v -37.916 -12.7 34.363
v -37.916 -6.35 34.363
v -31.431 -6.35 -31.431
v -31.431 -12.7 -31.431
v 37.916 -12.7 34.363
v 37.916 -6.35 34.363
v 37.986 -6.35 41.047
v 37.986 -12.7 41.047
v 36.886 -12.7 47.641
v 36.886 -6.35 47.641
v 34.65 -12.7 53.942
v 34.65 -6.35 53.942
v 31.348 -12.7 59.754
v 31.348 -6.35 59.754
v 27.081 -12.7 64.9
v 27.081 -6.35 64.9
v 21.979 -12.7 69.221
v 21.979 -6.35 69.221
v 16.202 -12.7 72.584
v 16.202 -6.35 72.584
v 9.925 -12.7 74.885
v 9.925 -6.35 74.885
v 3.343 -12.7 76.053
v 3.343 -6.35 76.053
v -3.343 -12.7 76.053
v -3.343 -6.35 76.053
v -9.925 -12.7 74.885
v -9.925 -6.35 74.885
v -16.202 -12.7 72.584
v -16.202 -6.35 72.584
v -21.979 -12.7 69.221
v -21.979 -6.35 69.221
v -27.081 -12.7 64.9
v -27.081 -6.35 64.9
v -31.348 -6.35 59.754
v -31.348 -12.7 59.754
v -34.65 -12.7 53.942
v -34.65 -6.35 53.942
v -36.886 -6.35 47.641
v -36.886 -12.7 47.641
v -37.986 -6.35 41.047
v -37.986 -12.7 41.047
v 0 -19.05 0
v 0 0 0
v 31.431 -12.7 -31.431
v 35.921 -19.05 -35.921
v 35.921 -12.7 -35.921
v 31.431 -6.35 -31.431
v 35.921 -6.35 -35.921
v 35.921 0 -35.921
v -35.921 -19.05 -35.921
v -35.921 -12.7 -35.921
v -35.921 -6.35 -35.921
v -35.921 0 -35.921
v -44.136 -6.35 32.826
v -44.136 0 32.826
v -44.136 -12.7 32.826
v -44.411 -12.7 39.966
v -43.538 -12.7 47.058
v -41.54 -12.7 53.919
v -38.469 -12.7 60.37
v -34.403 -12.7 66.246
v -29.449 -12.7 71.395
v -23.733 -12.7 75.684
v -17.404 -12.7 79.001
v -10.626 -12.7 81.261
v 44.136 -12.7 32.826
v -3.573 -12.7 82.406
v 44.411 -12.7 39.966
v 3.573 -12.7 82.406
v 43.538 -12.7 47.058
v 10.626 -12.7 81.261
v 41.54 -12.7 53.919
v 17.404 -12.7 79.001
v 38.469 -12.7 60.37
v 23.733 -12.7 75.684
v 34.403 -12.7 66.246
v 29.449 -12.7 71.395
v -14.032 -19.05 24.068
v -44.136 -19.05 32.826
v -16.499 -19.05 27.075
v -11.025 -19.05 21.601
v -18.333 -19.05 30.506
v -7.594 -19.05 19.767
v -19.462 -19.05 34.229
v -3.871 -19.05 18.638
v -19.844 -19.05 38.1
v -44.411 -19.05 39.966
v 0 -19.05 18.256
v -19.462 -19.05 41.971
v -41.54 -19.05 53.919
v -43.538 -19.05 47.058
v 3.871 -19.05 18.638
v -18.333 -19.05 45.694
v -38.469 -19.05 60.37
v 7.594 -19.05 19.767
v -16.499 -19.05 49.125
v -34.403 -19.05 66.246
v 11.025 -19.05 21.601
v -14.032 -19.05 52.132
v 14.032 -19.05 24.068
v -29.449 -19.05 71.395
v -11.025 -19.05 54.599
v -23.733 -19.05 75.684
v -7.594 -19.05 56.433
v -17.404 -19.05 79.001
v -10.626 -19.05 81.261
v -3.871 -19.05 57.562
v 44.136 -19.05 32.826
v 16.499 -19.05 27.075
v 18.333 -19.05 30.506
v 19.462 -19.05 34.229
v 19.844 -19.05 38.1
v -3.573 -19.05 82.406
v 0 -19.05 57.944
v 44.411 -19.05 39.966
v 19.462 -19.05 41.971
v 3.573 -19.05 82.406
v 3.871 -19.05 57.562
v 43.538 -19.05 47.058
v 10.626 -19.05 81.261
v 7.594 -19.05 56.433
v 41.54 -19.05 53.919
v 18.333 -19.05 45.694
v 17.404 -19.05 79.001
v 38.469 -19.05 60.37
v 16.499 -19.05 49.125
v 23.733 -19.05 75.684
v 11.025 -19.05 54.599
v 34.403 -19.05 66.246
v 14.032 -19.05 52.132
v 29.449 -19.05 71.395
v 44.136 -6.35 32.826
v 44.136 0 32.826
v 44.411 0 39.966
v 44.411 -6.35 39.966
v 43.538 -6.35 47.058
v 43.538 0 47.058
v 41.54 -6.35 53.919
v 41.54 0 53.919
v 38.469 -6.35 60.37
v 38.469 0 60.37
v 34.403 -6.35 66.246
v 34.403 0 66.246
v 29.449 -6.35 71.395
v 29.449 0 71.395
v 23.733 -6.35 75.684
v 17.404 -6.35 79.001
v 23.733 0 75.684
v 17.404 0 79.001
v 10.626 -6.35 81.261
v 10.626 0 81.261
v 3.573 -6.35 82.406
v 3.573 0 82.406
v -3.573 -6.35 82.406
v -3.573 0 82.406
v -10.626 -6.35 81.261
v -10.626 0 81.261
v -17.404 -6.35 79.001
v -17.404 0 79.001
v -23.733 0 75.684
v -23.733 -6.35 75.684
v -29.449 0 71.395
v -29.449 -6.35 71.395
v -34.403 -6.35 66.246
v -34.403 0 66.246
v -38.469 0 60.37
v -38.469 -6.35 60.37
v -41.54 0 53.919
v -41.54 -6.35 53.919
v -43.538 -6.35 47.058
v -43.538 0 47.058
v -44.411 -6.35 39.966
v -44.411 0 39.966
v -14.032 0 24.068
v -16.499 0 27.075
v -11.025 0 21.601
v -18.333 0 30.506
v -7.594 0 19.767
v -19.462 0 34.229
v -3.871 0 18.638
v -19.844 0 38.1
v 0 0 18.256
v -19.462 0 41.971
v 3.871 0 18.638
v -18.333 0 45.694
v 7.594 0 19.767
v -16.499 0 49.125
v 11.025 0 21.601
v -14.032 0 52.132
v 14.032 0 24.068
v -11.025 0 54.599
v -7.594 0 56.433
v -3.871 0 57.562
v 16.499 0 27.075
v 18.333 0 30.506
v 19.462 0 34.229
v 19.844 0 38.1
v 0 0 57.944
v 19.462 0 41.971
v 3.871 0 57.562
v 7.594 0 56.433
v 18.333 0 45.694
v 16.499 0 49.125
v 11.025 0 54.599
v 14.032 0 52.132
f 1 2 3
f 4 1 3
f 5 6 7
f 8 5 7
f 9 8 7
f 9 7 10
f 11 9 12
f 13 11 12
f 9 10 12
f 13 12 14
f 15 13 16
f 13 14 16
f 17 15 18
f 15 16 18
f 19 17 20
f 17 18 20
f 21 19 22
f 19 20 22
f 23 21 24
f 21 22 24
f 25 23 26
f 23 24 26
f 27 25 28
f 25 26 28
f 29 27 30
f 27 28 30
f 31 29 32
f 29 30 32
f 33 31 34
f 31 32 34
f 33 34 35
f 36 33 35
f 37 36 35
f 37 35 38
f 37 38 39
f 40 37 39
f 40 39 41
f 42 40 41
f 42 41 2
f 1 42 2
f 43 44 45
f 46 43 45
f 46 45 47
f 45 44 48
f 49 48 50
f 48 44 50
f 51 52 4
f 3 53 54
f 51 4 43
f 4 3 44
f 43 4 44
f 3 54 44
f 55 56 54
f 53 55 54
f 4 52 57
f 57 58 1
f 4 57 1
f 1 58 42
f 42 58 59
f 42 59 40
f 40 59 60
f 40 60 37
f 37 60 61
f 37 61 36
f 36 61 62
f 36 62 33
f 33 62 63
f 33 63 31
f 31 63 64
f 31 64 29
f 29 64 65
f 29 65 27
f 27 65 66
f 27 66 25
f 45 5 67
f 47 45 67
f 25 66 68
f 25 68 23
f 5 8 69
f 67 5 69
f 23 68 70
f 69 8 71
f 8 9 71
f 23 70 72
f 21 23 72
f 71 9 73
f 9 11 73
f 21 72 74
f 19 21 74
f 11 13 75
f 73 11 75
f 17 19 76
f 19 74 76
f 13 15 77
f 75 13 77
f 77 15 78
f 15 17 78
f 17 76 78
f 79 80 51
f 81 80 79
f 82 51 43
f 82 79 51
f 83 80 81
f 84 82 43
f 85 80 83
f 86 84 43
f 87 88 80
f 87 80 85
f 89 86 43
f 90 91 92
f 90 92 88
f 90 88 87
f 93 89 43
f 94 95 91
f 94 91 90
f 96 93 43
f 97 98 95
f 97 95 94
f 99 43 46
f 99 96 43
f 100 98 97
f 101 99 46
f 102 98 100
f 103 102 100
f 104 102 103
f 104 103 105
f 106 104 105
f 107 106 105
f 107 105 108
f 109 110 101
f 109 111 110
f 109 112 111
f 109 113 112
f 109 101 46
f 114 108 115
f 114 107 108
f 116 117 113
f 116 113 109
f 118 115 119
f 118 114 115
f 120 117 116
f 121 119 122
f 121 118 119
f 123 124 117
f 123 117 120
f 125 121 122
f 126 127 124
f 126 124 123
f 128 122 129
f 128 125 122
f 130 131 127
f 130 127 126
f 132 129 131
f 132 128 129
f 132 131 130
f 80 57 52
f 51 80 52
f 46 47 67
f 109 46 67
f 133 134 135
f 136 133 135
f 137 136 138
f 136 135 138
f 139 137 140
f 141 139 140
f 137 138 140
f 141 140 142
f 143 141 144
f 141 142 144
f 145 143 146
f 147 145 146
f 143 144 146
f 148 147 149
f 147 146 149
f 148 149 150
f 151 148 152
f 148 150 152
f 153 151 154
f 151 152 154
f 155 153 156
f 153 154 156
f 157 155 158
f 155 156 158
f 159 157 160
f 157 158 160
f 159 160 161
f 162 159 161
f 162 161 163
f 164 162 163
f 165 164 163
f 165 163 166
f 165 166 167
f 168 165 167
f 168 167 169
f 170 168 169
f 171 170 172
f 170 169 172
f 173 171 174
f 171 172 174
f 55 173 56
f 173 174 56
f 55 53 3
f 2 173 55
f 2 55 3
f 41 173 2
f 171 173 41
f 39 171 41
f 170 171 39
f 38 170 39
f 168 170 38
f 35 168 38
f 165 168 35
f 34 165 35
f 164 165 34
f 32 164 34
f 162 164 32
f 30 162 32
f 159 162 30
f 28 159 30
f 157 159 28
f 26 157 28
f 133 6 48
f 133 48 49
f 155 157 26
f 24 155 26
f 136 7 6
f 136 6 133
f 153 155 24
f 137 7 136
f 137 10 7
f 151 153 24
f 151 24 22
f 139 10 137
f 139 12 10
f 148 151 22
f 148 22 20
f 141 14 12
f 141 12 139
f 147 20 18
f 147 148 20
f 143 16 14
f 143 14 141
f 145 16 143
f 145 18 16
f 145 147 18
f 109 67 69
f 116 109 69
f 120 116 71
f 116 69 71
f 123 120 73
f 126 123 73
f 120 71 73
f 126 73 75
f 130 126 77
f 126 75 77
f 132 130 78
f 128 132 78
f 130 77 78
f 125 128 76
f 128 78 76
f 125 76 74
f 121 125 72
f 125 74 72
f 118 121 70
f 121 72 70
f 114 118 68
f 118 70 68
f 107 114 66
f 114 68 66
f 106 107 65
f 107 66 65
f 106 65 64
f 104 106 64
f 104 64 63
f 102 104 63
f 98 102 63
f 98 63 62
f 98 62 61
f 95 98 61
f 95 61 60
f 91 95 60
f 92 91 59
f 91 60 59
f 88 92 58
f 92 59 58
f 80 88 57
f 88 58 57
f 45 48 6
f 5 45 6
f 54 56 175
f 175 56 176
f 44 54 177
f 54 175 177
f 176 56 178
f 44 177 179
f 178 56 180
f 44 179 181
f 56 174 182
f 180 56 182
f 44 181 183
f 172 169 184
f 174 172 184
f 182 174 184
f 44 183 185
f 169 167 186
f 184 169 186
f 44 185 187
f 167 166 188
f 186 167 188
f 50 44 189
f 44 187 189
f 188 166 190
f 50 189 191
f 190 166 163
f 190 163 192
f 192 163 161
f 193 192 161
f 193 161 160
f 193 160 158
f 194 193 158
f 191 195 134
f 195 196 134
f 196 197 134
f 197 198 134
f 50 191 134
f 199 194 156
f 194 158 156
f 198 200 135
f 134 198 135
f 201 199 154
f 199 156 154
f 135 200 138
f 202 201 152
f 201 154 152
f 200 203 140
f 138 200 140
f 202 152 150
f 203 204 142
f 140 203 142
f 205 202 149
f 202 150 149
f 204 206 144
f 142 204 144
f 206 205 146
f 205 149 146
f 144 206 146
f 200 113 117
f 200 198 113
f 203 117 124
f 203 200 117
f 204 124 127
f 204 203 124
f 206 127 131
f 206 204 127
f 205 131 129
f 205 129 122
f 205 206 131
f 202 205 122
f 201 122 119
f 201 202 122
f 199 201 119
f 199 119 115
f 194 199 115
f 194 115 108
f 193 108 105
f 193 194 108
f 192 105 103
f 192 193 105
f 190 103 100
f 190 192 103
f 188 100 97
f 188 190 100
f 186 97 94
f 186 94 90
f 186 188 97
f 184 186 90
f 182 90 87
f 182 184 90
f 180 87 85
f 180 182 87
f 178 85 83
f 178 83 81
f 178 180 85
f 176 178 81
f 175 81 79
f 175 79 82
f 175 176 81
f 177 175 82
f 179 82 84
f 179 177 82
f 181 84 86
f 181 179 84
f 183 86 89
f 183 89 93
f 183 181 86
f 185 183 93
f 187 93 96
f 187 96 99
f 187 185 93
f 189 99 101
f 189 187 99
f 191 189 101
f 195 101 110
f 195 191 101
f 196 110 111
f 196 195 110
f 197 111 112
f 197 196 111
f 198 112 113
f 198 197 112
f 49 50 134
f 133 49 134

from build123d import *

# Parameters (mm, degrees)
SKETCH_R            = 19.84375
PAD_DEPTH           = 6.35
SKETCH001_R         = 19.84375
PAD001_DEPTH        = 6.35
LINEARPATTERN_COUNT = 2
LINEARPATTERN_PITCH = 12.7


with BuildPart() as part:
    # Sketch → Pad (new body)
    with BuildSketch(Plane.XZ):
        with BuildLine():
            ThreePointArc((44.136002, 32.82593), (0, 82.55), (-44.136002, 32.82593))
            Line((-44.136002, 32.82593), (-35.921024, -35.921024))
            Line((-35.921024, -35.921024), (0, 0))
            Line((0, 0), (35.921024, -35.921024))
            Line((35.921024, -35.921024), (44.136002, 32.82593))
        make_face()
        with Locations((0, 38.1)):
            Circle(SKETCH_R, mode=Mode.SUBTRACT)
    pad = extrude(amount=PAD_DEPTH)

    # Sketch001 (on DatumPlane) → Pad001 (join)
    with BuildSketch(Plane.XZ.offset(6.35)):
        with BuildLine():
            ThreePointArc((37.916242, 34.362546), (0, 76.2), (-37.916242, 34.362546))
            Line((-37.916242, 34.362546), (-31.430896, -31.430896))
            Line((-31.430896, -31.430896), (0, 0))
            Line((0, 0), (31.430896, -31.430896))
            Line((31.430896, -31.430896), (37.916242, 34.362546))
        make_face()
        with Locations((0, 38.1)):
            Circle(SKETCH001_R, mode=Mode.SUBTRACT)
    extrude(amount=PAD001_DEPTH)

    # LinearPattern: Pad ×2
    with Locations(*[(0, -i * LINEARPATTERN_PITCH, 0) for i in range(1, LINEARPATTERN_COUNT)]):
        add(pad)


solid = part.part
